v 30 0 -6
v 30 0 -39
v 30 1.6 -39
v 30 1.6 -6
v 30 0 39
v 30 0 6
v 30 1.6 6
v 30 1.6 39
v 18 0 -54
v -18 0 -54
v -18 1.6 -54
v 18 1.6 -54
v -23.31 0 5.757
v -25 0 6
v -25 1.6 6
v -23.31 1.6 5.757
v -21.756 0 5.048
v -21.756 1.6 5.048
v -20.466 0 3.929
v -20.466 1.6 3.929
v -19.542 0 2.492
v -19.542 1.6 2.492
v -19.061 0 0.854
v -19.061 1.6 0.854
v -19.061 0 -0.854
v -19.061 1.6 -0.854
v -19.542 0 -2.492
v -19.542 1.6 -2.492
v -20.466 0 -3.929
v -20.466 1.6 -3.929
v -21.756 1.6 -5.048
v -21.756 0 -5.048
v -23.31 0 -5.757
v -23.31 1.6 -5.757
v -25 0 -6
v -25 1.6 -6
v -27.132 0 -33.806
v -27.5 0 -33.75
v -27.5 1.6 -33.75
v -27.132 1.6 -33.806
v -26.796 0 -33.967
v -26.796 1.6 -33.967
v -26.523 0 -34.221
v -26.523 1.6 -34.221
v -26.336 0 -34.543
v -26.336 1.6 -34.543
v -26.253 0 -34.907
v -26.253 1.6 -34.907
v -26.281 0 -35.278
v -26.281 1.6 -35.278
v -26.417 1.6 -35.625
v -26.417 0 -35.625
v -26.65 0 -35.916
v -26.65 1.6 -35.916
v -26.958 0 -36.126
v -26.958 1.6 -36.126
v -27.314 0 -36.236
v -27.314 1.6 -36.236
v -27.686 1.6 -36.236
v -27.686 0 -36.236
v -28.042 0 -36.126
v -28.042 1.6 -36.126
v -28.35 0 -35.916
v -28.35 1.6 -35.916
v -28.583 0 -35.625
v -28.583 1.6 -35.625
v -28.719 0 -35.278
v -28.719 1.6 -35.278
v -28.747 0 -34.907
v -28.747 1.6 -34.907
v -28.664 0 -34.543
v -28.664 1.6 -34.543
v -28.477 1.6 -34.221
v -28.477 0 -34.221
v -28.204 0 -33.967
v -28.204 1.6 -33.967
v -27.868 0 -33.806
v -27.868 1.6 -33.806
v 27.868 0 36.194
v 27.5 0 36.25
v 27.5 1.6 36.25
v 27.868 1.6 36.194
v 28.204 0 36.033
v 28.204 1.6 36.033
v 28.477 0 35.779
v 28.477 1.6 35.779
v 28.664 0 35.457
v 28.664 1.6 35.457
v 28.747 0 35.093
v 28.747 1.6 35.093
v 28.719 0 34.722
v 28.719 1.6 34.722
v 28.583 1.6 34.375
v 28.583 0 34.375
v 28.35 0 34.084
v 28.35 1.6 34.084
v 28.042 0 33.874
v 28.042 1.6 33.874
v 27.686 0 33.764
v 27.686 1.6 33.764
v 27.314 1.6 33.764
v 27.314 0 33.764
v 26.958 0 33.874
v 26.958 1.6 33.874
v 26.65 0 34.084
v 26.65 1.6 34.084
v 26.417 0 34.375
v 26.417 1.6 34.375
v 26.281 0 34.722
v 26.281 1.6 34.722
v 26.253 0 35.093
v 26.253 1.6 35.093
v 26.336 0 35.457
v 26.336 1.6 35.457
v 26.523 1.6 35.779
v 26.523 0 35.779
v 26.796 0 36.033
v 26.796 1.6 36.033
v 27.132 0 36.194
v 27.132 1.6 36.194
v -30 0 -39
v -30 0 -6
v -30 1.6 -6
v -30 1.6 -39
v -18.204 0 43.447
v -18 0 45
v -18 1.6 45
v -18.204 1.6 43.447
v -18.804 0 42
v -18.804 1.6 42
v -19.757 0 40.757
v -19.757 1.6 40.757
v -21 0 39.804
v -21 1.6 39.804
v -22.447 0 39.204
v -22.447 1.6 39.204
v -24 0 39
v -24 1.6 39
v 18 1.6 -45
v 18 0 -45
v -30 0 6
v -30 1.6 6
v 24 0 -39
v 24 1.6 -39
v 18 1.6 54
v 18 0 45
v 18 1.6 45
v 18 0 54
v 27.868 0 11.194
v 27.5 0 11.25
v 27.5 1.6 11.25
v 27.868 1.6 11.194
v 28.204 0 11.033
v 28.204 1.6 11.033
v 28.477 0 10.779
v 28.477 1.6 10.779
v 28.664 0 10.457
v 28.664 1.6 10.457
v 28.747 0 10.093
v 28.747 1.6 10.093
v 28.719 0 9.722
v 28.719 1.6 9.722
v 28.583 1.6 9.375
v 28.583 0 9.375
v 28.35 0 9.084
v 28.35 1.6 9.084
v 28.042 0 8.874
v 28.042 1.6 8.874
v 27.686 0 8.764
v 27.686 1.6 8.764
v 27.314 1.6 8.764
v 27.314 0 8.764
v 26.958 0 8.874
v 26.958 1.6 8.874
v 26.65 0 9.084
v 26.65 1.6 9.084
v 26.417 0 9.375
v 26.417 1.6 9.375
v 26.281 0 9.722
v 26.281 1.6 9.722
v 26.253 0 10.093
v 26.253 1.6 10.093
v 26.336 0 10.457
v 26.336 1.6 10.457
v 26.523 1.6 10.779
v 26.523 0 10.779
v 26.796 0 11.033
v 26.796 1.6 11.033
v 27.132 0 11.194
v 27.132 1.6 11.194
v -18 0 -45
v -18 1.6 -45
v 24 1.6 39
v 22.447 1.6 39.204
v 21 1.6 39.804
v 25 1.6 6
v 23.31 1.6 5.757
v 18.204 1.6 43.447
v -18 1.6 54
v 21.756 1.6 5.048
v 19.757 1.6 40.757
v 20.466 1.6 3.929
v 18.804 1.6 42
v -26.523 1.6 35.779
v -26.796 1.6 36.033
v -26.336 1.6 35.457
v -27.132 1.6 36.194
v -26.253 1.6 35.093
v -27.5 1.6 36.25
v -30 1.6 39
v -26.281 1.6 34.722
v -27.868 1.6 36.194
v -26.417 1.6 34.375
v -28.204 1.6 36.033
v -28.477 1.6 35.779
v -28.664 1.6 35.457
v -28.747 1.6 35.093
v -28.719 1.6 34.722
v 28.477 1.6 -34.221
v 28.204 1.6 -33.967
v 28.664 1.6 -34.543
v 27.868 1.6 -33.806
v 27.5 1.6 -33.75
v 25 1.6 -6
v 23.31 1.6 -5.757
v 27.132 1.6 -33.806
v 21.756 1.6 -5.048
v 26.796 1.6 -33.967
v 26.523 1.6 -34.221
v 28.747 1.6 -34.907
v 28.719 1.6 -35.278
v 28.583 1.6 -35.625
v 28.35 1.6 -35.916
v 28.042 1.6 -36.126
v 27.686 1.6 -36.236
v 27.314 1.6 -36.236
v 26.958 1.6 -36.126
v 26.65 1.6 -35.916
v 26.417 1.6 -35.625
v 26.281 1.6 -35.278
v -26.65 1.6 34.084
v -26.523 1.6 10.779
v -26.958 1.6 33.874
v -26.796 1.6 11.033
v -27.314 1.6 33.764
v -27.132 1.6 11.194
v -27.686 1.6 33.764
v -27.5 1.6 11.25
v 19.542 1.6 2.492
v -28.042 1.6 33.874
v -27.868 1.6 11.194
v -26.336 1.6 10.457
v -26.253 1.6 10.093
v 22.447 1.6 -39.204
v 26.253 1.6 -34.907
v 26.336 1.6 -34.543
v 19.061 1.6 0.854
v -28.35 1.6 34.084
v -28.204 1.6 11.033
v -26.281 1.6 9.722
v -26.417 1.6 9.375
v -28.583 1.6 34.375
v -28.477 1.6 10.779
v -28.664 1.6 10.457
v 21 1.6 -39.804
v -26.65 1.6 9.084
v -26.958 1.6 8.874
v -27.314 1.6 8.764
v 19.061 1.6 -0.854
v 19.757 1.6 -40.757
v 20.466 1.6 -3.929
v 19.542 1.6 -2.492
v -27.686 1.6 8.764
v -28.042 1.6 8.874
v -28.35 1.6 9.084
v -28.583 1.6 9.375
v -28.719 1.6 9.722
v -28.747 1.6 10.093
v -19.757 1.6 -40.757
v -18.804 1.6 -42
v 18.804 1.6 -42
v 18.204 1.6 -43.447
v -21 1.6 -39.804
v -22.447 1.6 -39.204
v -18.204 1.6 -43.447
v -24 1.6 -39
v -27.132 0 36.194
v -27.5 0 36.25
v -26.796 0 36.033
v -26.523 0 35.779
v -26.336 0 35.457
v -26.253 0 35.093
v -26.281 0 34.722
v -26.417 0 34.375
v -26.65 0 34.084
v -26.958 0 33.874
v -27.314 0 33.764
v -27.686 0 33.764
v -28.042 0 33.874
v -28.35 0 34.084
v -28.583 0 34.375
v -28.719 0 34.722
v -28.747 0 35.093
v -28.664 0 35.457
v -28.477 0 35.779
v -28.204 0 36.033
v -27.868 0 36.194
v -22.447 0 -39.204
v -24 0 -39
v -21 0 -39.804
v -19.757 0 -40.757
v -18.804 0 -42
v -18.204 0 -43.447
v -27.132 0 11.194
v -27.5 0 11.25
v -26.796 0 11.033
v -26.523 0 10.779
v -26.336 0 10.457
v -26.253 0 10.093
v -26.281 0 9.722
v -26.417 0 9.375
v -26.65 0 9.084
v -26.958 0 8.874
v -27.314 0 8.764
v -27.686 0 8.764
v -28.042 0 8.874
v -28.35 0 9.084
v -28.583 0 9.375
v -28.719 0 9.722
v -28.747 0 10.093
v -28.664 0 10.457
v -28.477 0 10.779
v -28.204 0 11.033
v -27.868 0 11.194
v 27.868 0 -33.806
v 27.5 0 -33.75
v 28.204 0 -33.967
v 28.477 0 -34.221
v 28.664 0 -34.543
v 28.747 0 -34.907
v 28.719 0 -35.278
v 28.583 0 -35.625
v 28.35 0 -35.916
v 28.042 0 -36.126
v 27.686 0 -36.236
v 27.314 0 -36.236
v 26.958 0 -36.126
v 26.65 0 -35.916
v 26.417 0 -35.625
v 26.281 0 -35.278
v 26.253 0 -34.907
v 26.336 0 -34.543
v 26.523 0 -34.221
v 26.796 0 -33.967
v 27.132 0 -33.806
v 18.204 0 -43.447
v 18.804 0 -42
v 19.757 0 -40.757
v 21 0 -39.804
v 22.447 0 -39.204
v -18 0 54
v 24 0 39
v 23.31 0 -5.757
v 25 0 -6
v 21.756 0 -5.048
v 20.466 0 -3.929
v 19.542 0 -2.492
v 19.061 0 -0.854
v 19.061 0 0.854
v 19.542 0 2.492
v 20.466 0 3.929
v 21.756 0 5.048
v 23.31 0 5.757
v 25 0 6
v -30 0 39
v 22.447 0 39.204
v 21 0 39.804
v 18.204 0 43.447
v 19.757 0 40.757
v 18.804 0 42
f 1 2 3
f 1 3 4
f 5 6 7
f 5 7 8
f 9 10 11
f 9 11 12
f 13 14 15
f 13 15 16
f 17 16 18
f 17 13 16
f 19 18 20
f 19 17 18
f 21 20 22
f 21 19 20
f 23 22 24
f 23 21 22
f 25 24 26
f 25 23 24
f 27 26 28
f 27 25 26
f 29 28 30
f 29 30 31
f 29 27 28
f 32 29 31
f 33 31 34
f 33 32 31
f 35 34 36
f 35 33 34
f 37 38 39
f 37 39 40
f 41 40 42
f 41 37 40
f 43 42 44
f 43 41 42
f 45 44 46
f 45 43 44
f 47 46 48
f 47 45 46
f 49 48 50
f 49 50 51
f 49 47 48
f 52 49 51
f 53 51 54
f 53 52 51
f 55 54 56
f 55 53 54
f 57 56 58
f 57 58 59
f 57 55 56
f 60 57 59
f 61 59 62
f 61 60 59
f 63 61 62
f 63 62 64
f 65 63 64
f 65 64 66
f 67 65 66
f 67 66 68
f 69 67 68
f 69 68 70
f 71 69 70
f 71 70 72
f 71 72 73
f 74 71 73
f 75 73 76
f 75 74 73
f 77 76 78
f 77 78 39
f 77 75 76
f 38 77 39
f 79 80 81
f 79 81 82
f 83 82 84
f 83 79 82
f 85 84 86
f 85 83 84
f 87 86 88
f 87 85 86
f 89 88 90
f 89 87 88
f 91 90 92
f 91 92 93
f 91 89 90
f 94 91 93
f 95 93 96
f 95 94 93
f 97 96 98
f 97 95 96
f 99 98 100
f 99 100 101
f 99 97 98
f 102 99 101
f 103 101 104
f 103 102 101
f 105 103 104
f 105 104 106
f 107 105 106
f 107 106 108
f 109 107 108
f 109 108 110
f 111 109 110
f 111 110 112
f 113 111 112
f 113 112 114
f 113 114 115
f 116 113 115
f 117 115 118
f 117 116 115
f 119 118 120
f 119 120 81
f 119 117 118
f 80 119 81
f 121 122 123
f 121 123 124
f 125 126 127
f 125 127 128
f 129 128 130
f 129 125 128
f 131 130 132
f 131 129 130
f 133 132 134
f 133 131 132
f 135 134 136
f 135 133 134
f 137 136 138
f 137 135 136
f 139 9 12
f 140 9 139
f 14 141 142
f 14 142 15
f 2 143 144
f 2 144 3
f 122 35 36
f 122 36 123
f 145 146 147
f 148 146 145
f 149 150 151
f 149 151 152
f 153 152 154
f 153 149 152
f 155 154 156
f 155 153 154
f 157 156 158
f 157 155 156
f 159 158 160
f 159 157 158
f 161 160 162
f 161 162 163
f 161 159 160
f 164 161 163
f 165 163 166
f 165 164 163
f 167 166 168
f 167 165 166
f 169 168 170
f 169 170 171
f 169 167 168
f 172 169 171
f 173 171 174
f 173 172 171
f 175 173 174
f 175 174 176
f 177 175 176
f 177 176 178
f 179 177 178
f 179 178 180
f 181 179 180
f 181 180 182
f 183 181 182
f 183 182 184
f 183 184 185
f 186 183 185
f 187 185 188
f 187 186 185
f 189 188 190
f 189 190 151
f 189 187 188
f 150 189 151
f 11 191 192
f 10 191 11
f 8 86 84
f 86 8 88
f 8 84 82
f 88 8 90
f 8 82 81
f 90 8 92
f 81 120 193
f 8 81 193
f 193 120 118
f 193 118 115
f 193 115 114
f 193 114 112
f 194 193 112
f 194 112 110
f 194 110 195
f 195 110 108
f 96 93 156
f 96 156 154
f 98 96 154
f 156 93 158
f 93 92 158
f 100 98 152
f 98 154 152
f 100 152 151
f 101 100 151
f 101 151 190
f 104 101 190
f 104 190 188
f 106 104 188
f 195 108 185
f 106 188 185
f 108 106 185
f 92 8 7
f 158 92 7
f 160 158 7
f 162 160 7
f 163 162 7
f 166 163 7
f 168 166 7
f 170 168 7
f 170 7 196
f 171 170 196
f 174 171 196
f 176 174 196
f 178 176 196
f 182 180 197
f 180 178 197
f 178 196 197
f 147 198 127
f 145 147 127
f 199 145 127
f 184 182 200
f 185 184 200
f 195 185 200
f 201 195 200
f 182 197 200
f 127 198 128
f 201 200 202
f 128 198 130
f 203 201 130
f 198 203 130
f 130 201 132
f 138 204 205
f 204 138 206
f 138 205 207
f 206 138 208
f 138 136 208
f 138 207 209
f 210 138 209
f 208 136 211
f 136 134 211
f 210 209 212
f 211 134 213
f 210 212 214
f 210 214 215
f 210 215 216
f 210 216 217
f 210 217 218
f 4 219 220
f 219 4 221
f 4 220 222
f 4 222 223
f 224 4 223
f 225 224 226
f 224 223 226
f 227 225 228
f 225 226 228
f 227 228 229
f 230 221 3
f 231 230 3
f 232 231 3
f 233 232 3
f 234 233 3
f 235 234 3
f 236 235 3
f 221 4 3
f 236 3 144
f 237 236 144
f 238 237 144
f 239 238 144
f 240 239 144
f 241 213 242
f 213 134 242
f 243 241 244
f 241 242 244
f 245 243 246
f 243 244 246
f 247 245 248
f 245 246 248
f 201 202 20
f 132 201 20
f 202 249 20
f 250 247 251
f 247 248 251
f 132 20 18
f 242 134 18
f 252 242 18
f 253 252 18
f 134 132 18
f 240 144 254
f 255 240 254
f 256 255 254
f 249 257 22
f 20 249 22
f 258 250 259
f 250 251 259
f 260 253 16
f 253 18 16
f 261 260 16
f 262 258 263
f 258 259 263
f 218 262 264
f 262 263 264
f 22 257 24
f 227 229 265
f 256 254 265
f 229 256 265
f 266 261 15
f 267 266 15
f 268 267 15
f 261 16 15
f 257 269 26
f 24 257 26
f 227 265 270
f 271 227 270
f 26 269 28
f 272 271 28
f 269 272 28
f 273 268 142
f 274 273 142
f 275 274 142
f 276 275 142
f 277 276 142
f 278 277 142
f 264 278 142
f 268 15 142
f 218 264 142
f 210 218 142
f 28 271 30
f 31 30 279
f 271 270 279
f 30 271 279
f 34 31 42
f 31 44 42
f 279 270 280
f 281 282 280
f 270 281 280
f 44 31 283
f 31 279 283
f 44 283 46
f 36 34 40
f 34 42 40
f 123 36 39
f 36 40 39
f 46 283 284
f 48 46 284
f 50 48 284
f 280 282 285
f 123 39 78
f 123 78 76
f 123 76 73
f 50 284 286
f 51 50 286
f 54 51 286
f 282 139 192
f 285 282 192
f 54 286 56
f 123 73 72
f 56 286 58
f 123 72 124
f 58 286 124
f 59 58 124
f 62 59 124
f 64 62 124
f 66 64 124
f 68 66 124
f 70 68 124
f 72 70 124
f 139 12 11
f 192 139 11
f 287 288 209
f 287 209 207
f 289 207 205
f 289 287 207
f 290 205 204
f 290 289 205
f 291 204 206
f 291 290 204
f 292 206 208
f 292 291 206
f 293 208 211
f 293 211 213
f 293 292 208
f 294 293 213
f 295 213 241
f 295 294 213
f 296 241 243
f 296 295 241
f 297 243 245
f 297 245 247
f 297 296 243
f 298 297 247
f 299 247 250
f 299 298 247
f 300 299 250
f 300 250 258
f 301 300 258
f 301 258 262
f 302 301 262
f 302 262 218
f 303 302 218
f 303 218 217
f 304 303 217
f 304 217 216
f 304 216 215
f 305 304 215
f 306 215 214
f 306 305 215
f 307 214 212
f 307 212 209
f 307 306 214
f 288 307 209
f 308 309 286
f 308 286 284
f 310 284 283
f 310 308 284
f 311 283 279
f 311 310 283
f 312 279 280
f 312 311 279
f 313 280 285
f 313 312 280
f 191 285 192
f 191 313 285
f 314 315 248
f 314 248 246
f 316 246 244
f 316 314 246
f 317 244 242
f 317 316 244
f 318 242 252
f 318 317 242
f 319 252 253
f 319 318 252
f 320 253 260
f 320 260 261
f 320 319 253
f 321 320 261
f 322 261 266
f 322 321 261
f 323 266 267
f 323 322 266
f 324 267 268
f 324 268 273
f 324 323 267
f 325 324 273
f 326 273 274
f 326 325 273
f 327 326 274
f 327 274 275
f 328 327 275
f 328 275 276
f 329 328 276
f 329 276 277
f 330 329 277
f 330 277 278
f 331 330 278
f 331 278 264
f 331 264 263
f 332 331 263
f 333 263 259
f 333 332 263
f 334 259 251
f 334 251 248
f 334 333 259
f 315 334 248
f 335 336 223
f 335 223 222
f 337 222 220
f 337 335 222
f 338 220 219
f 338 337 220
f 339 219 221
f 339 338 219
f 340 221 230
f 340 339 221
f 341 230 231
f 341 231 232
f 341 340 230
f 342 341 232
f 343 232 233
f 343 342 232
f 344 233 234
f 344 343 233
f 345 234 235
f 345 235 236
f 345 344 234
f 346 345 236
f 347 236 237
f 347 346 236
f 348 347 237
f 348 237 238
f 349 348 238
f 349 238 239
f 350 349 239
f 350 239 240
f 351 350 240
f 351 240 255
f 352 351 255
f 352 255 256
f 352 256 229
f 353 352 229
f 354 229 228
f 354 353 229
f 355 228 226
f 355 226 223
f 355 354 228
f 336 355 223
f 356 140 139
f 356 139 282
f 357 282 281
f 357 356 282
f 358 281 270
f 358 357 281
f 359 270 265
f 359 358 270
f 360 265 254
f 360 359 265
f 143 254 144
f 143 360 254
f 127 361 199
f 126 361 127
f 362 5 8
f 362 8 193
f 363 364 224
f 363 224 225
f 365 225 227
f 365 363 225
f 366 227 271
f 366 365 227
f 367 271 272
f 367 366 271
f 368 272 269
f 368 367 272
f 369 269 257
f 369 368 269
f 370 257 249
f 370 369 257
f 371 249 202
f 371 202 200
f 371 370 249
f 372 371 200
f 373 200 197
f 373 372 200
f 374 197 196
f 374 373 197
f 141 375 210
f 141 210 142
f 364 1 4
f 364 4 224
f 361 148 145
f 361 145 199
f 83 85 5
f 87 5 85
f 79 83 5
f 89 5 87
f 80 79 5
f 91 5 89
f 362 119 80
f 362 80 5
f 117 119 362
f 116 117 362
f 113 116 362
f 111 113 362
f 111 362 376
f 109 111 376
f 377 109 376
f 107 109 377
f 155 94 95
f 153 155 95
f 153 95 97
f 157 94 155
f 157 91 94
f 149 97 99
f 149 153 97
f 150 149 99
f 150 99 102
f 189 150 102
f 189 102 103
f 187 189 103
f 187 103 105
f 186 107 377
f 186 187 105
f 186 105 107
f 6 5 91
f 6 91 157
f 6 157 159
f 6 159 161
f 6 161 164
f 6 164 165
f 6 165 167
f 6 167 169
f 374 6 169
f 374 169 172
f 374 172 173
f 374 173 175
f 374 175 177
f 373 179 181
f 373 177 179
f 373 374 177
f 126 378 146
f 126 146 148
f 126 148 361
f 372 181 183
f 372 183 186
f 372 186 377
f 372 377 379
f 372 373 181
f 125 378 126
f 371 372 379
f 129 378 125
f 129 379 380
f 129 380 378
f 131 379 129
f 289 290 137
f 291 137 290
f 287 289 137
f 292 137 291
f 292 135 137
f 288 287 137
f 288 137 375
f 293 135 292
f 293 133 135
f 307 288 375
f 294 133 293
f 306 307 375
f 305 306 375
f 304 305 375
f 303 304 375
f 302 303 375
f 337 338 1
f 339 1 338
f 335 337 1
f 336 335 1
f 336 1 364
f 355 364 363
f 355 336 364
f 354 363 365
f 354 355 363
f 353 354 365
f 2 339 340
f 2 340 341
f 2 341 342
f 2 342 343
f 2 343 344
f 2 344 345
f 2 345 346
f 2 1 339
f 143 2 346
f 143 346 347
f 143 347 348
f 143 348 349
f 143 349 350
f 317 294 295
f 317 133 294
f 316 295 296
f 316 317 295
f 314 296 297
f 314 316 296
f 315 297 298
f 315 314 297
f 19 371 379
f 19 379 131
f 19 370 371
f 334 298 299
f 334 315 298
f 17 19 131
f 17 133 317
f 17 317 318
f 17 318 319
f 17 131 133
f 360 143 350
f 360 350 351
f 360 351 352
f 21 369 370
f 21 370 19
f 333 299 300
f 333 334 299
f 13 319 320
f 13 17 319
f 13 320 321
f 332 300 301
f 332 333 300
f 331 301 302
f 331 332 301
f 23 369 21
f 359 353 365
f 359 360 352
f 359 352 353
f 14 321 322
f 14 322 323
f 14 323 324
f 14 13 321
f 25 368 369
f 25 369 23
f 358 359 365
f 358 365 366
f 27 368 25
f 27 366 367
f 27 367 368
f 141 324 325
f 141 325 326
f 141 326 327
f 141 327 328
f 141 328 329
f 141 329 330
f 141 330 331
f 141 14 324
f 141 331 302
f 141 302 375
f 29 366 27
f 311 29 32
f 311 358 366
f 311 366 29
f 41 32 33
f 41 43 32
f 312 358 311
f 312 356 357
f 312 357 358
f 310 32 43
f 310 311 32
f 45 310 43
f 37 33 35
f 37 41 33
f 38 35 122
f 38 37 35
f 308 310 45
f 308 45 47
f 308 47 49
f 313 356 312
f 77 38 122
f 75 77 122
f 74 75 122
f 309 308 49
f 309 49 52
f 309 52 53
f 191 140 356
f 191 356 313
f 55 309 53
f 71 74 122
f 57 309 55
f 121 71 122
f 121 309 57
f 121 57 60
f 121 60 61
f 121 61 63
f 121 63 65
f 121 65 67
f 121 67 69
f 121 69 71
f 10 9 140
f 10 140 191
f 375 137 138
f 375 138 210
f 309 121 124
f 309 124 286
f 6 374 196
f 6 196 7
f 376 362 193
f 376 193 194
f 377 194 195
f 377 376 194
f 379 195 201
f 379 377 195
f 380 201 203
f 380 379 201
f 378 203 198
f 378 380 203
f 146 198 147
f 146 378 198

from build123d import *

# Parameters (mm, degrees)
BOSS_EXTRUDE3_DEPTH = 1.6
SKETCH1_9_R         = 1.25
CUT_EXTRUDE2_DEPTH  = 1.6


with BuildPart() as part:
    # Sketch1 → Boss-Extrude3 (new body)
    with BuildSketch(Plane(origin=(0, 0, 0), x_dir=(1, 0, 0), z_dir=(0, 1, 0))):
        with BuildLine():
            Line((-30, -39), (-30, -6))
            Line((-30, -6), (-25, -6))
            ThreePointArc((-25, -6), (-19, 0), (-25, 6))
            Line((-25, 6), (-30, 6))
            Line((-30, 6), (-30, 39))
            Line((-30, 39), (-24, 39))
            ThreePointArc((-24, 39), (-19.757359313, 40.757359313), (-18, 45))
            Line((-18, 45), (-18, 54))
            Line((-18, 54), (18, 54))
            Line((18, 54), (18, 45))
            ThreePointArc((18, 45), (19.757359313, 40.757359313), (24, 39))
            Line((24, 39), (30, 39))
            Line((30, 39), (30, 6))
            Line((30, 6), (25, 6))
            ThreePointArc((25, 6), (19, 0), (25, -6))
            Line((25, -6), (30, -6))
            Line((30, -6), (30, -39))
            Line((30, -39), (24, -39))
            ThreePointArc((24, -39), (19.757359313, -40.757359313), (18, -45))
            Line((18, -45), (18, -54))
            Line((18, -54), (-18, -54))
            Line((-18, -54), (-18, -45))
            ThreePointArc((-18, -45), (-19.757359313, -40.757359313), (-24, -39))
            Line((-24, -39), (-30, -39))
        make_face()
    extrude(amount=BOSS_EXTRUDE3_DEPTH)

    # Sketch1<9> → Cut-Extrude2 (cut)
    with BuildSketch(Plane(origin=(0, 0, 0), x_dir=(1, 0, 0), z_dir=(0, 1, 0))):
        with Locations((-27.5, -35)):
            Circle(SKETCH1_9_R)
        with Locations((-27.5, -10)):
            Circle(SKETCH1_9_R)
        with Locations((27.5, -10)):
            Circle(SKETCH1_9_R)
        with Locations((27.5, -35)):
            Circle(SKETCH1_9_R)
        with Locations((27.5, 35)):
            Circle(SKETCH1_9_R)
        with Locations((-27.5, 35)):
            Circle(SKETCH1_9_R)
    extrude(amount=CUT_EXTRUDE2_DEPTH, mode=Mode.SUBTRACT)


solid = part.part
